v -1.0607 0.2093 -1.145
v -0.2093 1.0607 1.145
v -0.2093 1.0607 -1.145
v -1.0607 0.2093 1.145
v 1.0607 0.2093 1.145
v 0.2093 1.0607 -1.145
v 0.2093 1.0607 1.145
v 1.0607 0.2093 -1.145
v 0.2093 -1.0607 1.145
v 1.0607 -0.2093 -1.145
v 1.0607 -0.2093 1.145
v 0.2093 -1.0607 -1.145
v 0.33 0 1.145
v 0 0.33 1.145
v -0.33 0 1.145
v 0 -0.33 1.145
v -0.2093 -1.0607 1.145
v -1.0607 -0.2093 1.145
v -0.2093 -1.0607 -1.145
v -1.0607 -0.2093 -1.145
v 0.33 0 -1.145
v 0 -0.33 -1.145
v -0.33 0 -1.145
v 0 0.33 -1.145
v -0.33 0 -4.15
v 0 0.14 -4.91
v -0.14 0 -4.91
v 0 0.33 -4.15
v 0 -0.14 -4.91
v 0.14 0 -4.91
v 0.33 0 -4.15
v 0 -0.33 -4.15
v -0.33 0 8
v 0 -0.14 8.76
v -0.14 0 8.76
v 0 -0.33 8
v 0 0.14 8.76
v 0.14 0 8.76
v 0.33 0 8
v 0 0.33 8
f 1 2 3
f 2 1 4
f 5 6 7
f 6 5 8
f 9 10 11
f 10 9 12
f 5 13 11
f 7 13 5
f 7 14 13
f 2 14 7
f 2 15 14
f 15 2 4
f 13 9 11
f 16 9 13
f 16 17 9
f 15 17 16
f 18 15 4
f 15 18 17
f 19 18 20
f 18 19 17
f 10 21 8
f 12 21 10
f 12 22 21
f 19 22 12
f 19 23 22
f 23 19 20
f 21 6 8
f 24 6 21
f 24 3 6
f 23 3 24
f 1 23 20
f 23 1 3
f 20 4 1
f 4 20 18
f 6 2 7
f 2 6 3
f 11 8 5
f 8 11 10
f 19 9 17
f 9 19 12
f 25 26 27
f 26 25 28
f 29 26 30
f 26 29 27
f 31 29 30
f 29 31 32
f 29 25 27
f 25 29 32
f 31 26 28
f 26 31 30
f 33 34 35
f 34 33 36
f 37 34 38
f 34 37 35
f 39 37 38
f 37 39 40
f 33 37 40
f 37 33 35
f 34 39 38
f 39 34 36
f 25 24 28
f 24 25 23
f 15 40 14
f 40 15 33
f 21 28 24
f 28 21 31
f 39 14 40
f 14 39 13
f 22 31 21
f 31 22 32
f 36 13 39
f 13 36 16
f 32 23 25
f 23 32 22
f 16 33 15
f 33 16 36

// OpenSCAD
/**
 * Módulo que genera un pin de un conector.
 *
 * @param {Float} length Longitud del pin (eje Z).
 *
 * @author  Joaquín Fernández
 * @url     https://gitlab.com/joaquinfq/openscad/blob/master/Modules/Models/PCB/pin.scad
 * @license CC-BY-NC-4.0
 */
module pcbPin(length = 0)
{
    _l = length
        ? length
        : 6.75 + 2.50 + 2.90;
    intersection()
    {
        cylinder(d = 2.54, h = 2.29, center = true, $fn = 4);
        rotate([ 0, 0, 45 ])
        {
            cylinder(d = 3.0, h = 2.29, center = true, $fn = 4);
        }
    }
    translate([ 0, 0, _l / 2 - 2.50 / 2 - 2.90 ])
    {
        cylinder(d = 0.66, h = _l, center = true, $fn = 4);
        for (z = [ -1, 1 ])
        {
            translate([ 0, 0, z * (_l / 2 + 0.38) ])
            {
                rotate([ 90 * (z - 1), 0, 0 ])
                {
                    cylinder(d1 = 0.66, d2 = 0.28, h = 0.76, center = true, $fn = 4);
                }
            }
        }
    }
}
pcbPin();
